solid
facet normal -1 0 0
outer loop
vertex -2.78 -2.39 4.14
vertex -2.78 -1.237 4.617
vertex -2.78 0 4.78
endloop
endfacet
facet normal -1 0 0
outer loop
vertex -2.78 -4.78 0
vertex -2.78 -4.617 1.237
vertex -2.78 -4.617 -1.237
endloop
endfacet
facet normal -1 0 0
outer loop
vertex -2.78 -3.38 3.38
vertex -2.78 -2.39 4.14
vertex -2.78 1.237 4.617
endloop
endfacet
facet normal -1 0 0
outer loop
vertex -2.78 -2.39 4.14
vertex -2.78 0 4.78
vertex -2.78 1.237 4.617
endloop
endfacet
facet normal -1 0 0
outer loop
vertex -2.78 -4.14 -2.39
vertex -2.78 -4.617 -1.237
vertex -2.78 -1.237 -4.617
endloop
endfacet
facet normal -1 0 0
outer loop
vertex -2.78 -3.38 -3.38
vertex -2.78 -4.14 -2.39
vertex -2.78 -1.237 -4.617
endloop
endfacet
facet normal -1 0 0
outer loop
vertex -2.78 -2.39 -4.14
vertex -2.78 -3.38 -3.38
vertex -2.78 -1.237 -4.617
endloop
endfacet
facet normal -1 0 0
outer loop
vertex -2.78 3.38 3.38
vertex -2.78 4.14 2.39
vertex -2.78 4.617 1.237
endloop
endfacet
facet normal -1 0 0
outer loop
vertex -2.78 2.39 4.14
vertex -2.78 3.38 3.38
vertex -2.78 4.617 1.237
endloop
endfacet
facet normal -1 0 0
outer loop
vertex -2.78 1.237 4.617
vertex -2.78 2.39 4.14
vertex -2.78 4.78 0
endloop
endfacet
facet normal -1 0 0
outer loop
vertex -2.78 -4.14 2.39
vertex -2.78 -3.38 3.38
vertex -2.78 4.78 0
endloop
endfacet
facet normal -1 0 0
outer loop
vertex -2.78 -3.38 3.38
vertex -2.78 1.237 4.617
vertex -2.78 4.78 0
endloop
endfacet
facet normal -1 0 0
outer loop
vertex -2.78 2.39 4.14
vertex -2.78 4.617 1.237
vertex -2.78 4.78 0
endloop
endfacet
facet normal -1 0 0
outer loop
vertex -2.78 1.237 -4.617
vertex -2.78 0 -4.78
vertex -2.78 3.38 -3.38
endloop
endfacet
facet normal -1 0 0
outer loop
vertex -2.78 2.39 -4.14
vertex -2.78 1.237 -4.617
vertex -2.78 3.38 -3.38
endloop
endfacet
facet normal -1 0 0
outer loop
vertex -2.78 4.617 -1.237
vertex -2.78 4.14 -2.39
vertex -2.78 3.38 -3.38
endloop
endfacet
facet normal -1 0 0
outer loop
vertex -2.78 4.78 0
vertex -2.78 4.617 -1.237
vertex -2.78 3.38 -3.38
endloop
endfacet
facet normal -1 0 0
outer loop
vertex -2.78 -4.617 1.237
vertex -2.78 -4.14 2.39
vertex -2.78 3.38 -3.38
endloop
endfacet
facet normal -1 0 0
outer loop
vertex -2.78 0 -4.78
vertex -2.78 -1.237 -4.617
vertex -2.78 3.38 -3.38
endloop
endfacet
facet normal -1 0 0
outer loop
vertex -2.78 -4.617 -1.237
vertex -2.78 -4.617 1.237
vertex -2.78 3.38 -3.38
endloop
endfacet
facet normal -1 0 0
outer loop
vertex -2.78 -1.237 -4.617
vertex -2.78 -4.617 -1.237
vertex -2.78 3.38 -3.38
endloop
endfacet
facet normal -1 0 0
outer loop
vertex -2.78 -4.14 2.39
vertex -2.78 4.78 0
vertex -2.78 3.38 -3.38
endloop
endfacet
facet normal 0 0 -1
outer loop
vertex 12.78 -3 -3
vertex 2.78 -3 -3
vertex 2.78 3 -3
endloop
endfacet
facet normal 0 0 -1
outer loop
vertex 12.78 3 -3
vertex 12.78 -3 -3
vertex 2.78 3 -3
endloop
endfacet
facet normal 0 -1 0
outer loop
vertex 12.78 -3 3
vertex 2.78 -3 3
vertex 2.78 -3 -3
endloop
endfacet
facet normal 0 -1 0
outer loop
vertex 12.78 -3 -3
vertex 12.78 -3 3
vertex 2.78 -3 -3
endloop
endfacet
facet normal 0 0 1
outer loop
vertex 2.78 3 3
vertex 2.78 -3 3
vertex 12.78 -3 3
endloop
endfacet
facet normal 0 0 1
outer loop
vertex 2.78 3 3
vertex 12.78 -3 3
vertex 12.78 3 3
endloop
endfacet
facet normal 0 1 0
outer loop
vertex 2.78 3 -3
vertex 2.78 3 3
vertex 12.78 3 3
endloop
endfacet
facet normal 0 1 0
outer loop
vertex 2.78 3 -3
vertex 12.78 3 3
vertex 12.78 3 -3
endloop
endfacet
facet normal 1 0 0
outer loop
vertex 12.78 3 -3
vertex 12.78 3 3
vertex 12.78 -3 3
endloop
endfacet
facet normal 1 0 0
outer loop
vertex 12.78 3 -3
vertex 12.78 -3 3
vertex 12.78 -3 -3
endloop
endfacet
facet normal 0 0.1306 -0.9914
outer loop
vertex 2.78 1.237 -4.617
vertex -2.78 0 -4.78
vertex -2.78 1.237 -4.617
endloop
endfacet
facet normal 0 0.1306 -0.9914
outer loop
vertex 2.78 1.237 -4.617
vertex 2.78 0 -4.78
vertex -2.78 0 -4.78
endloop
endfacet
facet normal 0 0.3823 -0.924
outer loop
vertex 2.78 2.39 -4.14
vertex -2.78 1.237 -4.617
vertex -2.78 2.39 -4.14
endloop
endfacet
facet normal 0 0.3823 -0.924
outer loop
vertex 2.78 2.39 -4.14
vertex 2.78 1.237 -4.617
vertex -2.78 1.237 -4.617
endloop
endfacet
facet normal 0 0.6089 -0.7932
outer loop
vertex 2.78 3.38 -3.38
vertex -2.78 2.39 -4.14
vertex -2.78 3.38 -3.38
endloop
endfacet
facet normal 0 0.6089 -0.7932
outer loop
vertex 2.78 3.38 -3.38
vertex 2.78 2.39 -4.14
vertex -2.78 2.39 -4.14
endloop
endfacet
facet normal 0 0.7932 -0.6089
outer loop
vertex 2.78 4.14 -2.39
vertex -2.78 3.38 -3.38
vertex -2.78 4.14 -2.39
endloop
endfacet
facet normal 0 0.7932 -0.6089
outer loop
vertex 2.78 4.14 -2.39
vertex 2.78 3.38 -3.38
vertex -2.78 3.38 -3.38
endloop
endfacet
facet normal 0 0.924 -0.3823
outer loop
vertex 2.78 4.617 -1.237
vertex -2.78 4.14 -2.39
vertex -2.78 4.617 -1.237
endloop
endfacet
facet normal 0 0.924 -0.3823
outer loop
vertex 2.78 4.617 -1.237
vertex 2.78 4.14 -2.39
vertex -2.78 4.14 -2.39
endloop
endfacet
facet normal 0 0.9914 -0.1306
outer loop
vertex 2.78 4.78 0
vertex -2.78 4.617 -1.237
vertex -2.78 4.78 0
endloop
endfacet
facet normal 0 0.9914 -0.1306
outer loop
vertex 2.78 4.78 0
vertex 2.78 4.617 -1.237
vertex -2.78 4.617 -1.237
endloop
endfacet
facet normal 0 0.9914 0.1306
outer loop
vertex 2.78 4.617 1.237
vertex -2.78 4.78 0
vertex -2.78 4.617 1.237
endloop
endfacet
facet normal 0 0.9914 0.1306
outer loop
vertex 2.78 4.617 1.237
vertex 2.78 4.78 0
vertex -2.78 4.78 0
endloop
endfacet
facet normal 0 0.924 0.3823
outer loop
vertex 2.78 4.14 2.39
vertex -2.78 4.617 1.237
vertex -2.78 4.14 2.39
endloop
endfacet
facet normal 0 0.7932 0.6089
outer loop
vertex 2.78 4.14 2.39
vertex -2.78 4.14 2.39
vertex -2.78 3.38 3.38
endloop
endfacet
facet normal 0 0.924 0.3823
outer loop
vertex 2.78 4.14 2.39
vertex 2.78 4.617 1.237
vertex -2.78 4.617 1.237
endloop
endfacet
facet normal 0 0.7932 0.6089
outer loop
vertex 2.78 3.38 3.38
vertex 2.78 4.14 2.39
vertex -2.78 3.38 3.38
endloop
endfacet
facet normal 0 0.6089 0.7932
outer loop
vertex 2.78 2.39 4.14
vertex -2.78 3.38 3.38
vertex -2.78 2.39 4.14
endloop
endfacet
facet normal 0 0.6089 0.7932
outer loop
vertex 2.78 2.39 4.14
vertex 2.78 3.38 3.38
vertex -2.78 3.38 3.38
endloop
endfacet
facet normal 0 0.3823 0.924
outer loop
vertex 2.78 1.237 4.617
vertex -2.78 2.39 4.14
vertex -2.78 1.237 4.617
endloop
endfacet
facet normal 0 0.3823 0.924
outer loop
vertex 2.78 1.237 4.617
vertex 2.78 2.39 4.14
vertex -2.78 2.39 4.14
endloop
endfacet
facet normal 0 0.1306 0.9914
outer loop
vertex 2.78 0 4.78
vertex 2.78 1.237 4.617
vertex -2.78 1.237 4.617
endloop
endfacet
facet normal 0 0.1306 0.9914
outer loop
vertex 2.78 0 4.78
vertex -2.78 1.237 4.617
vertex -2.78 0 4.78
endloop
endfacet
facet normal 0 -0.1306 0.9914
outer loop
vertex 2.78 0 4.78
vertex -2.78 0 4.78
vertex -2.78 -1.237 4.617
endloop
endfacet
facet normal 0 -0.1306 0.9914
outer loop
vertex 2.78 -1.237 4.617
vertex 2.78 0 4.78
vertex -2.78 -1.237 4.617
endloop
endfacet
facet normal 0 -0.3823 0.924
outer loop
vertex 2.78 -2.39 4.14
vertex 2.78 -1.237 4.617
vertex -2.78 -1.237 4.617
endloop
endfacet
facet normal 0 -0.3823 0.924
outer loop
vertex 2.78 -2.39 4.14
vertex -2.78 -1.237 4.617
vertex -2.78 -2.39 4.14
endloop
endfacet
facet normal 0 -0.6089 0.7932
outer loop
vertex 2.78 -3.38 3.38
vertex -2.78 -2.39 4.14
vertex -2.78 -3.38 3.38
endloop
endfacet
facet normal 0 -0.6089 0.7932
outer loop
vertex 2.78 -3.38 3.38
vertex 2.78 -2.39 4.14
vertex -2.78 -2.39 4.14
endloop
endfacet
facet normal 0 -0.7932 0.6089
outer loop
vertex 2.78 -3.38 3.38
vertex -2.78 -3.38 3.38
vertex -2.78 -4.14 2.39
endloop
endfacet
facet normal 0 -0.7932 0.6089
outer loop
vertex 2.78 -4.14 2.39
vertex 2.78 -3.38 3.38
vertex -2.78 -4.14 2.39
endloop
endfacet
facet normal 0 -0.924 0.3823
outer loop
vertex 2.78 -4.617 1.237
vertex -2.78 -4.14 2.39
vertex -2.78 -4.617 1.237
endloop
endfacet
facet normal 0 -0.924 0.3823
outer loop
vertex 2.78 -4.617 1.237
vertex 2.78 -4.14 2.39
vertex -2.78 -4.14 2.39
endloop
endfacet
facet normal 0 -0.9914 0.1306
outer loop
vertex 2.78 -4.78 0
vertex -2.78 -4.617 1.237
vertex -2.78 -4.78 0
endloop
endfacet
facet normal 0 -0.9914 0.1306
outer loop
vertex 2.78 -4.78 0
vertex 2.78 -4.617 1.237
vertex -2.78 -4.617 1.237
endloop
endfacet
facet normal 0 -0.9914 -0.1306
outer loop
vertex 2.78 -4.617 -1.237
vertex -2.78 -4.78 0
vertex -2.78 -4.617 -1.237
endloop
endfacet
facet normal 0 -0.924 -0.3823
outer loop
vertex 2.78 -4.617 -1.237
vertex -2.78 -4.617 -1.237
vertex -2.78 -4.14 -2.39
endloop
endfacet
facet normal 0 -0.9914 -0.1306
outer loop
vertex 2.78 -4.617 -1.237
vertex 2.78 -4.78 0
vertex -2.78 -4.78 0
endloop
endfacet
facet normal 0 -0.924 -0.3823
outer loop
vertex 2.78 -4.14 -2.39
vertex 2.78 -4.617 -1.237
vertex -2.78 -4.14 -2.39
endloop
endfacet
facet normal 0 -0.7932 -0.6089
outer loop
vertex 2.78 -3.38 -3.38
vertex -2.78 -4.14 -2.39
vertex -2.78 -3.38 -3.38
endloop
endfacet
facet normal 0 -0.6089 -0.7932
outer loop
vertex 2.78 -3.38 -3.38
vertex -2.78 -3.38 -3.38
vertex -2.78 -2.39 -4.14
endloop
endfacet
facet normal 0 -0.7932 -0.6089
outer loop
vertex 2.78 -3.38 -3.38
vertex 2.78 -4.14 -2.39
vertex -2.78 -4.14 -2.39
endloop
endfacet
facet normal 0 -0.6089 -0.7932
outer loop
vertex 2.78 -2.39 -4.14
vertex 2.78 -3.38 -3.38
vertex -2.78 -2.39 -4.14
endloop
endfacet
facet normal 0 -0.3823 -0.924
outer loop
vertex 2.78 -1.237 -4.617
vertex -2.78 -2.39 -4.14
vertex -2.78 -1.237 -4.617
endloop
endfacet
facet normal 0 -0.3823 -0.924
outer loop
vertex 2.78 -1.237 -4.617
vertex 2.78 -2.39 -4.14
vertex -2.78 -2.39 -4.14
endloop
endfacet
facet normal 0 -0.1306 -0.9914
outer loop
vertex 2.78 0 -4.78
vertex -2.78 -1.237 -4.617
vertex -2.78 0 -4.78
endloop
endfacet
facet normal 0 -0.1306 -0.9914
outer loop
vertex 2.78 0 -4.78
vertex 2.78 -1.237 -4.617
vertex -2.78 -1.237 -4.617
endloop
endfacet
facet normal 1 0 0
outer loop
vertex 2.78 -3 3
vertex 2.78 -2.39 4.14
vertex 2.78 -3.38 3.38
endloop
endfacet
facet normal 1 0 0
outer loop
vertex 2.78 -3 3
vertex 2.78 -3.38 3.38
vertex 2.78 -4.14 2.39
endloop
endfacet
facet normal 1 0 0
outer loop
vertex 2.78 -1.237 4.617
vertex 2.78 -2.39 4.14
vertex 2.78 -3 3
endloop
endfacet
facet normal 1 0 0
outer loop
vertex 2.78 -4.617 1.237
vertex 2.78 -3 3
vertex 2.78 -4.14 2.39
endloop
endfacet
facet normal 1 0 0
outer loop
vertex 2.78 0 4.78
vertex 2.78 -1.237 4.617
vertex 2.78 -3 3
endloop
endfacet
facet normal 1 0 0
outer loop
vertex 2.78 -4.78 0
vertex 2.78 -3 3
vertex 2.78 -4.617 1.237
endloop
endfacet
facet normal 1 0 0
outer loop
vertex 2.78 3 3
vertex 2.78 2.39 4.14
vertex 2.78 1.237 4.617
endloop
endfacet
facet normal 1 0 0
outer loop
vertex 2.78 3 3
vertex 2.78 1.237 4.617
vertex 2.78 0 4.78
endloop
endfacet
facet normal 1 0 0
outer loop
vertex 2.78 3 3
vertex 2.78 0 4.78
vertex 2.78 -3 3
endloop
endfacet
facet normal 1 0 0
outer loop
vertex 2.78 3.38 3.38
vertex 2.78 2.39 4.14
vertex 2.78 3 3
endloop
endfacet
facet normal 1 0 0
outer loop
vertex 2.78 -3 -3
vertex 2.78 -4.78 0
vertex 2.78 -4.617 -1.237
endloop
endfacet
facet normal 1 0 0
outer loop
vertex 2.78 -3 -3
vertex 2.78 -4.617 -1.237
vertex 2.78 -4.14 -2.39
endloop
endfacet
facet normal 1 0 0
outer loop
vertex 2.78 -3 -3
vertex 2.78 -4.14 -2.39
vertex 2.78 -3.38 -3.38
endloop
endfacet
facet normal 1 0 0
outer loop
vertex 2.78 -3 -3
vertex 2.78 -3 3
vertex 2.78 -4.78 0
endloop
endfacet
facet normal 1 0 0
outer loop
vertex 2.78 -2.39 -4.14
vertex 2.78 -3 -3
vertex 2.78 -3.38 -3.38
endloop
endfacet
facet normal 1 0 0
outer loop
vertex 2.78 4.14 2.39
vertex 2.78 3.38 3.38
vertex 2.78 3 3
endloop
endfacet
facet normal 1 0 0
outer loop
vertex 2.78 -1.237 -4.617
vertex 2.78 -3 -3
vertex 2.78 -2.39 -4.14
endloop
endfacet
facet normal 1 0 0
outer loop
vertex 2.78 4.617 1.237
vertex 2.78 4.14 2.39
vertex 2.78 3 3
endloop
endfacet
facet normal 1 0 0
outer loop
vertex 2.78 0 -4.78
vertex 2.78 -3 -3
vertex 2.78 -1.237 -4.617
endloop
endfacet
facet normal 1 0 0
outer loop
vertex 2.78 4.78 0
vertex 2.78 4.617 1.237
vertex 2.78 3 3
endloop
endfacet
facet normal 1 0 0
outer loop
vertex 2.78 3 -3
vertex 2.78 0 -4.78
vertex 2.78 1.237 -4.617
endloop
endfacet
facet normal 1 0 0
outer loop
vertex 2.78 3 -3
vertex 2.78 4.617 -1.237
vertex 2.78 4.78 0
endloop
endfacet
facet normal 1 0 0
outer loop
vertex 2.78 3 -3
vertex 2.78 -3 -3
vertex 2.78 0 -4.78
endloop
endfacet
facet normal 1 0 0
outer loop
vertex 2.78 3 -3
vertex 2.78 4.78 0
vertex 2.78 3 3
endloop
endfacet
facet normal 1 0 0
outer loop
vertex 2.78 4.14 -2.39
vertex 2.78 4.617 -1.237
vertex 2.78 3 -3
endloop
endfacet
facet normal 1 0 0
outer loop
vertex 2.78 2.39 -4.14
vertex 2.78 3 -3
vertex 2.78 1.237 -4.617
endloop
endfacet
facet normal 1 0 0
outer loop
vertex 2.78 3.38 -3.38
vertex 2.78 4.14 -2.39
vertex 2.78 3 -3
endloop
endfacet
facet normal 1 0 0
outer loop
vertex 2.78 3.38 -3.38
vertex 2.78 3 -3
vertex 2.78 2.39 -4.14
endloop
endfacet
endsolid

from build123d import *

# Parameters (mm, degrees)
SKETCH1_R           = 4.78
BOSS_EXTRUDE1_DEPTH = 2.78
SKETCH2_W           = 6
SKETCH2_H           = 6
BOSS_EXTRUDE2_DEPTH = 10


with BuildPart() as part:
    # Sketch1 → Boss-Extrude1 (new, symmetric)
    with BuildSketch(Plane(origin=(0, 0, 0), x_dir=(0, 0, -1), z_dir=(1, 0, 0))):
        Circle(SKETCH1_R)
    extrude(amount=BOSS_EXTRUDE1_DEPTH, both=True)

    # Sketch2 → Boss-Extrude2 (add)
    with BuildSketch(Plane(origin=(2.78, 0, 0), x_dir=(0, 0, -1), z_dir=(1, 0, 0))):
        Rectangle(SKETCH2_W, SKETCH2_H)
    extrude(amount=BOSS_EXTRUDE2_DEPTH)


solid = part.part
